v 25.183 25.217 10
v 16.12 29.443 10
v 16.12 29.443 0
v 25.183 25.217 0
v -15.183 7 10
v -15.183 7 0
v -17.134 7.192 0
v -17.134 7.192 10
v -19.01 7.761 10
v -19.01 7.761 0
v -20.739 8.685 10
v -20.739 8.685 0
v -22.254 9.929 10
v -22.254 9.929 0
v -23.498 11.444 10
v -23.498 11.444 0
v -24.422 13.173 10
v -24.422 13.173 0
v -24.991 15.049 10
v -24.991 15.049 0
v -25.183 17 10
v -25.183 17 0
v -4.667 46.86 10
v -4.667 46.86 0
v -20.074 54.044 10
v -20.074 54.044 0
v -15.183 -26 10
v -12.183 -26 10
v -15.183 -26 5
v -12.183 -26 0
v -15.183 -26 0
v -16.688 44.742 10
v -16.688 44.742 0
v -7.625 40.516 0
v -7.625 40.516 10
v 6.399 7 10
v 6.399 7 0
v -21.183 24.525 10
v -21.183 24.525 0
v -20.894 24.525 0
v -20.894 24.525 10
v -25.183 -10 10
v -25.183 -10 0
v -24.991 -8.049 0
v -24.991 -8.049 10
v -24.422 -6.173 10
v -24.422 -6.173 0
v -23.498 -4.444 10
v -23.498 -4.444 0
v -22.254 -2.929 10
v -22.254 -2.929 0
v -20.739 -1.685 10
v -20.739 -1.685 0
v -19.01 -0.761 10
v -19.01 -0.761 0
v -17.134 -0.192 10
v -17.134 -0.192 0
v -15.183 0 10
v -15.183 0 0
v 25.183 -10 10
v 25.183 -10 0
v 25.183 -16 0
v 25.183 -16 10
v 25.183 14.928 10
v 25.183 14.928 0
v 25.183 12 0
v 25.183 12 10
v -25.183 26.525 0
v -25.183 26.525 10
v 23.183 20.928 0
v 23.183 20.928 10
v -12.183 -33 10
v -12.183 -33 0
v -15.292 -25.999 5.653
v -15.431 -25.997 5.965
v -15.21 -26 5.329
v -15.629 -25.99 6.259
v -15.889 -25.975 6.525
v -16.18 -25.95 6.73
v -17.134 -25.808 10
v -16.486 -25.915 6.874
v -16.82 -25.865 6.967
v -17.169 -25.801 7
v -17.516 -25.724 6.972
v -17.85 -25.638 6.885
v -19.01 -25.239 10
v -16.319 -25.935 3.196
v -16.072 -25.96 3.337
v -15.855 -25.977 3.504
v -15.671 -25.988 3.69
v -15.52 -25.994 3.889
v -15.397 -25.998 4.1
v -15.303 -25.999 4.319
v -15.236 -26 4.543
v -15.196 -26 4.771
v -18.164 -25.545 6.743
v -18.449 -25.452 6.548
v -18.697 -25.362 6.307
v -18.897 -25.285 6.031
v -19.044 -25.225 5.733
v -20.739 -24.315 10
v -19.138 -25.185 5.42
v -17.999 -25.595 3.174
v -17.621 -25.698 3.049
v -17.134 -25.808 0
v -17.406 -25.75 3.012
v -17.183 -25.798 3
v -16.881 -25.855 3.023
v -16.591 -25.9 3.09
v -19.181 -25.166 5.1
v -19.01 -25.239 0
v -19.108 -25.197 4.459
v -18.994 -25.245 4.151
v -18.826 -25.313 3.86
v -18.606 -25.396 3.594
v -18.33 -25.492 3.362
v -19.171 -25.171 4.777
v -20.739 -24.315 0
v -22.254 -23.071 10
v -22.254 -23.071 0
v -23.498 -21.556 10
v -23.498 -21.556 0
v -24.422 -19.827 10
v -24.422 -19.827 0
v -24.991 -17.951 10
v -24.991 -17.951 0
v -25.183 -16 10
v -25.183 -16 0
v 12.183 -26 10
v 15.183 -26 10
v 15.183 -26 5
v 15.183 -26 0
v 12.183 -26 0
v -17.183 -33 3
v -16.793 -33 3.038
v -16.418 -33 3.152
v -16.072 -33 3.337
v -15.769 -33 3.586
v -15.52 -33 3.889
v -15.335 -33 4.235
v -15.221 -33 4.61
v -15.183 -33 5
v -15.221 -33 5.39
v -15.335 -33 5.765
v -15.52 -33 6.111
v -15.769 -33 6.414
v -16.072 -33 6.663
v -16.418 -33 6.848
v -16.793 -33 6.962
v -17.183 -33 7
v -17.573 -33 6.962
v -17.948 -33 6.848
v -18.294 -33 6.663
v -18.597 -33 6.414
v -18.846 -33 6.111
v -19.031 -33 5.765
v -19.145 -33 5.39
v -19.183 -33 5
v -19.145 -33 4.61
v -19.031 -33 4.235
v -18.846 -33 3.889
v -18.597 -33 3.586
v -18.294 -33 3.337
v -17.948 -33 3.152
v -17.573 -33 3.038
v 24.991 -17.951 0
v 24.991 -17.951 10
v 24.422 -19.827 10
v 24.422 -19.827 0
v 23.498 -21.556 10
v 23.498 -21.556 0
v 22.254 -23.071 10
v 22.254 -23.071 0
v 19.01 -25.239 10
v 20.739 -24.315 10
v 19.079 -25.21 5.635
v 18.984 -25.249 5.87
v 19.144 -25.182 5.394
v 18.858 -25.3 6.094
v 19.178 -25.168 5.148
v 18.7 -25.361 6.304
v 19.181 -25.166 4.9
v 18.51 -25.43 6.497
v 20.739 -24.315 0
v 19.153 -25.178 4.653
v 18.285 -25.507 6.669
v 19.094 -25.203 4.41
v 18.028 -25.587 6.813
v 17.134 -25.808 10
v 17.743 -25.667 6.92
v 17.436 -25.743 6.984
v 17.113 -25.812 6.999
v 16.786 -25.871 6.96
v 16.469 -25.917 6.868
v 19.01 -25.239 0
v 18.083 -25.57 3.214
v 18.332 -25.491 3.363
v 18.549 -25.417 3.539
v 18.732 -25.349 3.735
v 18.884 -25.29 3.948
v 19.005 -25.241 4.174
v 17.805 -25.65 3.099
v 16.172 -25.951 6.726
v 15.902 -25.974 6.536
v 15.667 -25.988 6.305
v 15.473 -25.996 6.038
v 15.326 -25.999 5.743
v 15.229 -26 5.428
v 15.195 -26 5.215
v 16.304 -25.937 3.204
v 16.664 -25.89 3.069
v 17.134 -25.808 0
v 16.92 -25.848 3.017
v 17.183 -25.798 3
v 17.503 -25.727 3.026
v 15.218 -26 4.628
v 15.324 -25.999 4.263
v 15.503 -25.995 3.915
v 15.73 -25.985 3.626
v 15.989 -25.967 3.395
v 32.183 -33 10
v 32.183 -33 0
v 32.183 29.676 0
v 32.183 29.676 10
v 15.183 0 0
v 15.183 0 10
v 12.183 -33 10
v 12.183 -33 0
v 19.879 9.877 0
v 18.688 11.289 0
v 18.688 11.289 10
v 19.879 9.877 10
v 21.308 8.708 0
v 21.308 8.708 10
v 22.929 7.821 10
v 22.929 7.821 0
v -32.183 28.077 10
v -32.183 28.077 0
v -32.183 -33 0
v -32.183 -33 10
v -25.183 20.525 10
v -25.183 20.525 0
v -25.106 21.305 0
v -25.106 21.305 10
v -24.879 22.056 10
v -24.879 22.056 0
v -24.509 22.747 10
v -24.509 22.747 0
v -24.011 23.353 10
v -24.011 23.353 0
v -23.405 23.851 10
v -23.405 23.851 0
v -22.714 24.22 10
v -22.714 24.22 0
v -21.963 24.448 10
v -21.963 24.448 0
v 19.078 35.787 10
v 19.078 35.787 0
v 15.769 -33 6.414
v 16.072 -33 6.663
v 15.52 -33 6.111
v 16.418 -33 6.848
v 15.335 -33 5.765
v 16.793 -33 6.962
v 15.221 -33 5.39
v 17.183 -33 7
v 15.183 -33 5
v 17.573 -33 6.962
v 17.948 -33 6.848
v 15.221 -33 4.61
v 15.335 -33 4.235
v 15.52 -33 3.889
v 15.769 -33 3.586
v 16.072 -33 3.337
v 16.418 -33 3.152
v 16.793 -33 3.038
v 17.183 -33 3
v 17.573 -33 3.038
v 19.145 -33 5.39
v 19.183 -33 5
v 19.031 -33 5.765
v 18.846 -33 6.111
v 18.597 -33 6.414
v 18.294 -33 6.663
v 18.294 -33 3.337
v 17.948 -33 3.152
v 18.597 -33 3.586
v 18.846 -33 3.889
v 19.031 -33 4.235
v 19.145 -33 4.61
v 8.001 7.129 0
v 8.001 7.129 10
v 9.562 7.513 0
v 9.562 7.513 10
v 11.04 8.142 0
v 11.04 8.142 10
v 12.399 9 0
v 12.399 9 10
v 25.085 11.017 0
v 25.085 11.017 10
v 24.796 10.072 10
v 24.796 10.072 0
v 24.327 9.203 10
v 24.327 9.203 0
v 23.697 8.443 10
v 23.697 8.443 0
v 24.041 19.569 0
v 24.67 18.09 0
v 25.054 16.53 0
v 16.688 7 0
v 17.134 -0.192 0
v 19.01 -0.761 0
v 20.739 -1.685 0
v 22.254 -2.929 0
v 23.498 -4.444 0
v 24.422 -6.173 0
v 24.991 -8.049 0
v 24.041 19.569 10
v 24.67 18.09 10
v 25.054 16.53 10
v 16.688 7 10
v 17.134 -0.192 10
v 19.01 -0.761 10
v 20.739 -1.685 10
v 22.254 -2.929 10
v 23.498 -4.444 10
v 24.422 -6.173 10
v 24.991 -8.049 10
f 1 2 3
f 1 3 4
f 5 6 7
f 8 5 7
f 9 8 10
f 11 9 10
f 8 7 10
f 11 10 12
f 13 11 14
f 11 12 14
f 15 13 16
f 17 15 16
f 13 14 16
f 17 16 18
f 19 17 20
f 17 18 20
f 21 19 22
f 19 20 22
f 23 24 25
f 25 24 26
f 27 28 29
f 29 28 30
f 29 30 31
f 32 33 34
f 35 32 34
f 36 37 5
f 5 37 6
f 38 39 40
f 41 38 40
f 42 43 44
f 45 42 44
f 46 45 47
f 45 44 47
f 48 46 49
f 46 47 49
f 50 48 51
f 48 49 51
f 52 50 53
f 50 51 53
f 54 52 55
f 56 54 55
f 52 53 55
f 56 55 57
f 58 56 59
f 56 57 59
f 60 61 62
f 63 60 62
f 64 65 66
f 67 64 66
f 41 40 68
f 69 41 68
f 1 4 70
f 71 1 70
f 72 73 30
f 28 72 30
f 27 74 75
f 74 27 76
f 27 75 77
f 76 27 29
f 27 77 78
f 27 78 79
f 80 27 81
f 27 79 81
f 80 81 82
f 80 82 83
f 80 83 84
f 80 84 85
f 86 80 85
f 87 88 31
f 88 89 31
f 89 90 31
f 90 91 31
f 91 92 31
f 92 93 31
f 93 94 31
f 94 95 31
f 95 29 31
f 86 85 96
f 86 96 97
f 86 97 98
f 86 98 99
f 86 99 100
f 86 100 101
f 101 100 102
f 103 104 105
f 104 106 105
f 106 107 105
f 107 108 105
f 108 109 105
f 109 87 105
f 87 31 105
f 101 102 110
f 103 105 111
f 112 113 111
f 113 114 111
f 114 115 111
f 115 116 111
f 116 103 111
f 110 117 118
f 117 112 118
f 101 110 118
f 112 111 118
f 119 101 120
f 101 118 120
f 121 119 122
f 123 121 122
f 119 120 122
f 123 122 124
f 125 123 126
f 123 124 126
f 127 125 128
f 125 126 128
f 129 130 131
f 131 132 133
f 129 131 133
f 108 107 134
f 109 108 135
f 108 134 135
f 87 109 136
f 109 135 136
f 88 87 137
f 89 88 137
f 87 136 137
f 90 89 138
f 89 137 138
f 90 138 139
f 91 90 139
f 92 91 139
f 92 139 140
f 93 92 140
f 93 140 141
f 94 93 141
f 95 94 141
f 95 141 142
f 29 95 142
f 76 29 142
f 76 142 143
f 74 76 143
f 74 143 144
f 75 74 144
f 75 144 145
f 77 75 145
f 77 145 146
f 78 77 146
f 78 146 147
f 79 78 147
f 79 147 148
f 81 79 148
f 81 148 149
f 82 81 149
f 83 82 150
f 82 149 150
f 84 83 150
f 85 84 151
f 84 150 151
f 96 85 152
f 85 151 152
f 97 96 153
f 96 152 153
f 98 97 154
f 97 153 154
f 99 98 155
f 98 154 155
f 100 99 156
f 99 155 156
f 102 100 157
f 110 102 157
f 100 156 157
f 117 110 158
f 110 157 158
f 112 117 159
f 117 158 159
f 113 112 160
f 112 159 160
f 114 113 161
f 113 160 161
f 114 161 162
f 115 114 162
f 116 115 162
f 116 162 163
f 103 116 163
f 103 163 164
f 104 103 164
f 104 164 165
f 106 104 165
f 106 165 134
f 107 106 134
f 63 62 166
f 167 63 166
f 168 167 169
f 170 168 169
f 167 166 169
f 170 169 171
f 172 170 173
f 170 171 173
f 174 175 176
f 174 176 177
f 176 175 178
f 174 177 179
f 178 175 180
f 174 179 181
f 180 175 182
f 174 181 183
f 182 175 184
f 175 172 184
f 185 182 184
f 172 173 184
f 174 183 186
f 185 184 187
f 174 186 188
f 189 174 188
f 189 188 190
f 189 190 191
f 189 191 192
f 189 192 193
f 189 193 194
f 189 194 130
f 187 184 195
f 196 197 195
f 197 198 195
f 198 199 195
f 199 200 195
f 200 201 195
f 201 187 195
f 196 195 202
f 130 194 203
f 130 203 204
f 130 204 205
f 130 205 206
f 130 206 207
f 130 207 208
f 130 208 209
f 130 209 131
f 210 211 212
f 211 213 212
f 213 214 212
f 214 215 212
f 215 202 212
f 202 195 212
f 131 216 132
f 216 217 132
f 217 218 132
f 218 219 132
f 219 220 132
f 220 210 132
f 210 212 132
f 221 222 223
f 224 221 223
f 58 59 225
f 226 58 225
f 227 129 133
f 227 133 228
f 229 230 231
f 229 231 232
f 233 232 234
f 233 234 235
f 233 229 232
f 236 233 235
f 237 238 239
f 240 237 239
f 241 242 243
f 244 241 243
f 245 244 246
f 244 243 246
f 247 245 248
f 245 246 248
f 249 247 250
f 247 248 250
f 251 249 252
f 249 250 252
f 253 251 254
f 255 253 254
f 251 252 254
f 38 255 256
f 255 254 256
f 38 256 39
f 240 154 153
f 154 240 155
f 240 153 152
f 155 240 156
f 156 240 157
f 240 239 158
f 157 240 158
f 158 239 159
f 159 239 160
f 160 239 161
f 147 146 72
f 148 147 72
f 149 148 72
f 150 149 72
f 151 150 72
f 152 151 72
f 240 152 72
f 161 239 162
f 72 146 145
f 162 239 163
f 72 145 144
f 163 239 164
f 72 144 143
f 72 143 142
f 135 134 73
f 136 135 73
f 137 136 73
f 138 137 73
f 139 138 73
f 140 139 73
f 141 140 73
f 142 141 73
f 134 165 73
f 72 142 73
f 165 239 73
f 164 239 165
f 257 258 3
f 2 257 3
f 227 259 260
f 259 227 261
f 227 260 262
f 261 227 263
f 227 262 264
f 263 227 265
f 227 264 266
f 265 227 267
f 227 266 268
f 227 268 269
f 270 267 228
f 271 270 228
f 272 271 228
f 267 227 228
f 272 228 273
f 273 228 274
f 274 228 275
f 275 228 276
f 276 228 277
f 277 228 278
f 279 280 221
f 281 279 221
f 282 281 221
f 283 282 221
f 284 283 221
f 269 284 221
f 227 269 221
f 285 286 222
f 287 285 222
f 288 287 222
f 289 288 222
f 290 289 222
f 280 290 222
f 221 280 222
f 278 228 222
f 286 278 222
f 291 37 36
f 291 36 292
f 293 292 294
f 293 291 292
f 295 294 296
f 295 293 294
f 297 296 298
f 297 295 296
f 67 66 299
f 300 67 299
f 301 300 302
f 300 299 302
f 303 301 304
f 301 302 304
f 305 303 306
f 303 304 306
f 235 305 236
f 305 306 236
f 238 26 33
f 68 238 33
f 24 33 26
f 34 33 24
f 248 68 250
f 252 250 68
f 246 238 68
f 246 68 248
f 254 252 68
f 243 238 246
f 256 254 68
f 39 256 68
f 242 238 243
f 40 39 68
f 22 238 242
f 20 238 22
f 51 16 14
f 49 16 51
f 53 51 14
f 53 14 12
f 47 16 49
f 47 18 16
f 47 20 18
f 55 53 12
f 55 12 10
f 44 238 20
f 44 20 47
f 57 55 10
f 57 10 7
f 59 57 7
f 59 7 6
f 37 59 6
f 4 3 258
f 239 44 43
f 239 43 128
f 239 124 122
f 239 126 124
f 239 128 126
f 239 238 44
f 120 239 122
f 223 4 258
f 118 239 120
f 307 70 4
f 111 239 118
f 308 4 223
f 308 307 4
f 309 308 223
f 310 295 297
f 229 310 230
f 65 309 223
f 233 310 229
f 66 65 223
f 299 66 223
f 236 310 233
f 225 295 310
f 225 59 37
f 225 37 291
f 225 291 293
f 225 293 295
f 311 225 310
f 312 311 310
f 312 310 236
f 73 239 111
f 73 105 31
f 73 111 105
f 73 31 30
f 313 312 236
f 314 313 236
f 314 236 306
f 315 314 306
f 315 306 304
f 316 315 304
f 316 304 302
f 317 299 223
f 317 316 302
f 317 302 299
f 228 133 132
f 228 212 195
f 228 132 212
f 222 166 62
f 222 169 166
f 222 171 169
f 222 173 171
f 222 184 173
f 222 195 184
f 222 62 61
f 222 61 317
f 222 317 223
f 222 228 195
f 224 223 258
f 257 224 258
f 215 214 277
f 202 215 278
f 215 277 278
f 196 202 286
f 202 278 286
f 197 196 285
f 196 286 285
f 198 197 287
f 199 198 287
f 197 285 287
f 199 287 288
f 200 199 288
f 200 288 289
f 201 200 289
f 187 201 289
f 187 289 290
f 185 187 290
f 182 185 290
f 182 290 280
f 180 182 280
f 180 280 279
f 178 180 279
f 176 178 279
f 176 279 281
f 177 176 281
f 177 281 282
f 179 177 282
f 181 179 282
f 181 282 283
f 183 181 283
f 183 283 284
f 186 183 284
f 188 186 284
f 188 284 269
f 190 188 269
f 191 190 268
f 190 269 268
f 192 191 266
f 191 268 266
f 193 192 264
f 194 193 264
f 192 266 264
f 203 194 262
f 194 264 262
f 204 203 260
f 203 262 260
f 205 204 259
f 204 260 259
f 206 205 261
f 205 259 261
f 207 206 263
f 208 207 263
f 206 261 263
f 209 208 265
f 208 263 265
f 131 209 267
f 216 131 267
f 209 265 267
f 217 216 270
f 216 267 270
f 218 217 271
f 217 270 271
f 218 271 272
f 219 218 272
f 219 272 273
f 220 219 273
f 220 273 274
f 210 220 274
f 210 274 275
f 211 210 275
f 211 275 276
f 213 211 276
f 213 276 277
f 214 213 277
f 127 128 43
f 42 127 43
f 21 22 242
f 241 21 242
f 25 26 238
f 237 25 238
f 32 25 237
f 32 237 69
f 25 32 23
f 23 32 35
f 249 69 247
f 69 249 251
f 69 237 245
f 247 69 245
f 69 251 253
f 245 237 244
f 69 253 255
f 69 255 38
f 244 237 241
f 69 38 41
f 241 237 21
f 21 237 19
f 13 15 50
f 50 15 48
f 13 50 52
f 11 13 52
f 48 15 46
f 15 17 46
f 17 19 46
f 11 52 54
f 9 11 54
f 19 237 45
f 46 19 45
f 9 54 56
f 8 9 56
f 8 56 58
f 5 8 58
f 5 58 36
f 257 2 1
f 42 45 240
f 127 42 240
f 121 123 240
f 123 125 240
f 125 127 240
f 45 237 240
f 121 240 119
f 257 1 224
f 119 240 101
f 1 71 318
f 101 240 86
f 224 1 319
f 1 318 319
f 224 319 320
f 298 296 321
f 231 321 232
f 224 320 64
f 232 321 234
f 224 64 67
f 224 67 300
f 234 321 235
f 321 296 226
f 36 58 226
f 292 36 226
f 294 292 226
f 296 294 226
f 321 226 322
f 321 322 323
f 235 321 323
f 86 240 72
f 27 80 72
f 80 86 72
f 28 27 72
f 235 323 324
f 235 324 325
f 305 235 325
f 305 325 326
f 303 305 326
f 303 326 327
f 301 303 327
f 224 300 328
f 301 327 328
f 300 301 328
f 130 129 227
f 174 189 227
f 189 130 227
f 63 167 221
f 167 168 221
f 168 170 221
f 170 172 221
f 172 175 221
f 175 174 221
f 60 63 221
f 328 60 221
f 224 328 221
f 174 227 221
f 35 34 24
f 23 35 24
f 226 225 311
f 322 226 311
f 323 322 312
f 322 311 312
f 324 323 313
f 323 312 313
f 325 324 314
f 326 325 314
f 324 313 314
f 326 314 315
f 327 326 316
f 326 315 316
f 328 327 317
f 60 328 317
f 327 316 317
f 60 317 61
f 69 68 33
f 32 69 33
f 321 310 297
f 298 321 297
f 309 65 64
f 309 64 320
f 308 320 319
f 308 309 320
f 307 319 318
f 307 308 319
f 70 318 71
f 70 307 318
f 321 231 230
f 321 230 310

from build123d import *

# Parameters (mm, degrees)
SALIENTE_EXTRUIR1_DEPTH = 10
REDONDEO1_R             = 10
REDONDEO2_R             = 10
CROQUIS2_R              = 2
CORTAR_EXTRUIR1_DEPTH   = 10


with BuildPart() as part:
    # Croquis1 → Saliente-Extruir1 (new body)
    with BuildSketch(Plane.XY):
        with BuildLine():
            Line((-15.183023411, 0), (15.183023411, 0))
            ThreePointArc((15.183023411, 0), (22.254091223, -2.928932188), (25.183023411, -10))
            Line((25.183023411, -10), (25.183023411, -16))
            ThreePointArc((25.183023411, -16), (22.254091223, -23.071067812), (15.183023411, -26))
            Line((15.183023411, -26), (12.183023411, -26))
            Line((12.183023411, -26), (12.183023411, -33))
            Line((12.183023411, -33), (25.183023411, -33))
            Line((25.183023411, -33), (32.183023411, -33))
            Line((32.183023411, -33), (32.183023411, 7))
            Line((32.183023411, 7), (32.183023411, 29.676278345))
            Line((32.183023411, 29.676278345), (19.078273373, 35.787123646))
            Line((19.078273373, 35.787123646), (16.119945541, 29.442969137))
            Line((16.119945541, 29.442969137), (25.183023411, 25.216786519))
            Line((25.183023411, 25.216786519), (23.183023411, 20.927772678))
            Line((23.183023411, 20.927772678), (25.183023411, 20.927772678))
            Line((25.183023411, 20.927772678), (25.183023411, 12))
            ThreePointArc((25.183023411, 12), (23.718557317, 8.464466094), (20.183023411, 7))
            Line((20.183023411, 7), (18.68839635, 7))
            Line((18.68839635, 7), (18.68839635, 11.289013841))
            Line((18.68839635, 11.289013841), (16.68839635, 7))
            Line((16.68839635, 7), (12.399382509, 9))
            Line((12.399382509, 9), (12.399382509, 7))
            Line((12.399382509, 7), (-15.183023411, 7))
            ThreePointArc((-15.183023411, 7), (-22.254091223, 9.928932188), (-25.183023411, 17))
            Line((-25.183023411, 17), (-25.183023411, 20.524963692))
            ThreePointArc((-25.183023411, 20.524963692), (-24.011450536, 23.353390817), (-21.183023411, 24.524963692))
            Line((-21.183023411, 24.524963692), (-20.89400957, 24.524963692))
            Line((-20.89400957, 24.524963692), (-25.183023411, 26.524963692))
            Line((-25.183023411, 26.524963692), (-16.68839635, 44.741750212))
            Line((-16.68839635, 44.741750212), (-7.62531848, 40.515567594))
            Line((-7.62531848, 40.515567594), (-4.666990648, 46.859722104))
            Line((-4.666990648, 46.859722104), (-20.074223027, 54.044232553))
            Line((-20.074223027, 54.044232553), (-32.183023411, 28.076826331))
            Line((-32.183023411, 28.076826331), (-32.183023411, 7))
            Line((-32.183023411, 7), (-32.183023411, -33))
            Line((-32.183023411, -33), (-25.183023411, -33))
            Line((-25.183023411, -33), (-12.183023411, -33))
            Line((-12.183023411, -33), (-12.183023411, -26))
            Line((-12.183023411, -26), (-15.183023411, -26))
            ThreePointArc((-15.183023411, -26), (-22.254091223, -23.071067812), (-25.183023411, -16))
            Line((-25.183023411, -16), (-25.183023411, -10))
            ThreePointArc((-25.183023411, -10), (-22.254091223, -2.928932188), (-15.183023411, 0))
        make_face()
    extrude(amount=SALIENTE_EXTRUIR1_DEPTH)

    # Redondeo1
    # the kernel refuses this fillet: 10 mm, written as the material it adds along each edge
    with BuildSketch(Plane(origin=(18.68839635, 7, 0), x_dir=(0, 1, 0), z_dir=(0, 0, 1))) as redondeo1_piece_1_section:
        with BuildLine():
            CenterArc((10, -8.208814597), REDONDEO1_R, 124.826871163, 55.173128837)
            Line((0, -8.208814597), (-0.2, -8.208814597))
            Line((-0.2, -8.208814597), (-0.2, 0))
            Line((-0.2, 0), (0, 0.2))
            ThreePointArc((0, 0.2), (2.144506921, 0.2), (4.174794118, 0.164176292))
            Line((4.174794118, 0.164176292), (4.289013841, 0))
        make_face()
    redondeo1_piece_1 = extrude(amount=10, mode=Mode.PRIVATE)
    redondeo1_piece_1 = split(redondeo1_piece_1, bisect_by=Plane(origin=(17.840933122, 9.471623083, 5), z_dir=(0.9063077870366527, -0.4226182617406938, 0)), keep=Keep.TOP, mode=Mode.PRIVATE)
    add(redondeo1_piece_1)
    with BuildSketch(Plane(origin=(12.399382509, 7, 0), x_dir=(-1, 0, 0), z_dir=(0, 0, 1))) as redondeo1_piece_2:
        with BuildLine():
            CenterArc((6, -10), REDONDEO1_R, 90, 36.869897646)
            Line((0, -2), (-0.12, -1.84))
            ThreePointArc((-0.12, -1.84), (-0.2, -1), (-0.2, 0))
            Line((-0.2, 0), (0, 0.2))
            Line((0, 0.2), (6, 0.2))
            Line((6, 0.2), (6, 0))
        make_face()
    extrude(amount=10)

    # Redondeo2
    # the kernel refuses this fillet: 10 mm, written as the material it adds along each edge
    with BuildSketch(Plane(origin=(25.183023411, 20.927772678, 0), x_dir=(-1, 0, 0), z_dir=(0, 0, 1))) as redondeo2_piece_1:
        with BuildLine():
            CenterArc((10, 6), REDONDEO2_R, 180, 36.869897646)
            Line((0, 6), (-0.2, 6))
            Line((-0.2, 6), (-0.2, 0))
            Line((-0.2, 0), (0, -0.2))
            ThreePointArc((0, -0.2), (1, -0.2), (1.84, -0.12))
            Line((1.84, -0.12), (2, 0))
        make_face()
    extrude(amount=10)

    # Croquis2 → Cortar-Extruir1 (cut)
    with BuildSketch(Plane.XZ.offset(33)):
        with Locations(Location((-17.183023411, 5, 0), (0, 0, 270))):
            Circle(CROQUIS2_R)
        with Locations(Location((17.183023411, 5, 0), (0, 0, 270))):
            Circle(CROQUIS2_R)
    extrude(amount=-CORTAR_EXTRUIR1_DEPTH, mode=Mode.SUBTRACT)


solid = part.part
